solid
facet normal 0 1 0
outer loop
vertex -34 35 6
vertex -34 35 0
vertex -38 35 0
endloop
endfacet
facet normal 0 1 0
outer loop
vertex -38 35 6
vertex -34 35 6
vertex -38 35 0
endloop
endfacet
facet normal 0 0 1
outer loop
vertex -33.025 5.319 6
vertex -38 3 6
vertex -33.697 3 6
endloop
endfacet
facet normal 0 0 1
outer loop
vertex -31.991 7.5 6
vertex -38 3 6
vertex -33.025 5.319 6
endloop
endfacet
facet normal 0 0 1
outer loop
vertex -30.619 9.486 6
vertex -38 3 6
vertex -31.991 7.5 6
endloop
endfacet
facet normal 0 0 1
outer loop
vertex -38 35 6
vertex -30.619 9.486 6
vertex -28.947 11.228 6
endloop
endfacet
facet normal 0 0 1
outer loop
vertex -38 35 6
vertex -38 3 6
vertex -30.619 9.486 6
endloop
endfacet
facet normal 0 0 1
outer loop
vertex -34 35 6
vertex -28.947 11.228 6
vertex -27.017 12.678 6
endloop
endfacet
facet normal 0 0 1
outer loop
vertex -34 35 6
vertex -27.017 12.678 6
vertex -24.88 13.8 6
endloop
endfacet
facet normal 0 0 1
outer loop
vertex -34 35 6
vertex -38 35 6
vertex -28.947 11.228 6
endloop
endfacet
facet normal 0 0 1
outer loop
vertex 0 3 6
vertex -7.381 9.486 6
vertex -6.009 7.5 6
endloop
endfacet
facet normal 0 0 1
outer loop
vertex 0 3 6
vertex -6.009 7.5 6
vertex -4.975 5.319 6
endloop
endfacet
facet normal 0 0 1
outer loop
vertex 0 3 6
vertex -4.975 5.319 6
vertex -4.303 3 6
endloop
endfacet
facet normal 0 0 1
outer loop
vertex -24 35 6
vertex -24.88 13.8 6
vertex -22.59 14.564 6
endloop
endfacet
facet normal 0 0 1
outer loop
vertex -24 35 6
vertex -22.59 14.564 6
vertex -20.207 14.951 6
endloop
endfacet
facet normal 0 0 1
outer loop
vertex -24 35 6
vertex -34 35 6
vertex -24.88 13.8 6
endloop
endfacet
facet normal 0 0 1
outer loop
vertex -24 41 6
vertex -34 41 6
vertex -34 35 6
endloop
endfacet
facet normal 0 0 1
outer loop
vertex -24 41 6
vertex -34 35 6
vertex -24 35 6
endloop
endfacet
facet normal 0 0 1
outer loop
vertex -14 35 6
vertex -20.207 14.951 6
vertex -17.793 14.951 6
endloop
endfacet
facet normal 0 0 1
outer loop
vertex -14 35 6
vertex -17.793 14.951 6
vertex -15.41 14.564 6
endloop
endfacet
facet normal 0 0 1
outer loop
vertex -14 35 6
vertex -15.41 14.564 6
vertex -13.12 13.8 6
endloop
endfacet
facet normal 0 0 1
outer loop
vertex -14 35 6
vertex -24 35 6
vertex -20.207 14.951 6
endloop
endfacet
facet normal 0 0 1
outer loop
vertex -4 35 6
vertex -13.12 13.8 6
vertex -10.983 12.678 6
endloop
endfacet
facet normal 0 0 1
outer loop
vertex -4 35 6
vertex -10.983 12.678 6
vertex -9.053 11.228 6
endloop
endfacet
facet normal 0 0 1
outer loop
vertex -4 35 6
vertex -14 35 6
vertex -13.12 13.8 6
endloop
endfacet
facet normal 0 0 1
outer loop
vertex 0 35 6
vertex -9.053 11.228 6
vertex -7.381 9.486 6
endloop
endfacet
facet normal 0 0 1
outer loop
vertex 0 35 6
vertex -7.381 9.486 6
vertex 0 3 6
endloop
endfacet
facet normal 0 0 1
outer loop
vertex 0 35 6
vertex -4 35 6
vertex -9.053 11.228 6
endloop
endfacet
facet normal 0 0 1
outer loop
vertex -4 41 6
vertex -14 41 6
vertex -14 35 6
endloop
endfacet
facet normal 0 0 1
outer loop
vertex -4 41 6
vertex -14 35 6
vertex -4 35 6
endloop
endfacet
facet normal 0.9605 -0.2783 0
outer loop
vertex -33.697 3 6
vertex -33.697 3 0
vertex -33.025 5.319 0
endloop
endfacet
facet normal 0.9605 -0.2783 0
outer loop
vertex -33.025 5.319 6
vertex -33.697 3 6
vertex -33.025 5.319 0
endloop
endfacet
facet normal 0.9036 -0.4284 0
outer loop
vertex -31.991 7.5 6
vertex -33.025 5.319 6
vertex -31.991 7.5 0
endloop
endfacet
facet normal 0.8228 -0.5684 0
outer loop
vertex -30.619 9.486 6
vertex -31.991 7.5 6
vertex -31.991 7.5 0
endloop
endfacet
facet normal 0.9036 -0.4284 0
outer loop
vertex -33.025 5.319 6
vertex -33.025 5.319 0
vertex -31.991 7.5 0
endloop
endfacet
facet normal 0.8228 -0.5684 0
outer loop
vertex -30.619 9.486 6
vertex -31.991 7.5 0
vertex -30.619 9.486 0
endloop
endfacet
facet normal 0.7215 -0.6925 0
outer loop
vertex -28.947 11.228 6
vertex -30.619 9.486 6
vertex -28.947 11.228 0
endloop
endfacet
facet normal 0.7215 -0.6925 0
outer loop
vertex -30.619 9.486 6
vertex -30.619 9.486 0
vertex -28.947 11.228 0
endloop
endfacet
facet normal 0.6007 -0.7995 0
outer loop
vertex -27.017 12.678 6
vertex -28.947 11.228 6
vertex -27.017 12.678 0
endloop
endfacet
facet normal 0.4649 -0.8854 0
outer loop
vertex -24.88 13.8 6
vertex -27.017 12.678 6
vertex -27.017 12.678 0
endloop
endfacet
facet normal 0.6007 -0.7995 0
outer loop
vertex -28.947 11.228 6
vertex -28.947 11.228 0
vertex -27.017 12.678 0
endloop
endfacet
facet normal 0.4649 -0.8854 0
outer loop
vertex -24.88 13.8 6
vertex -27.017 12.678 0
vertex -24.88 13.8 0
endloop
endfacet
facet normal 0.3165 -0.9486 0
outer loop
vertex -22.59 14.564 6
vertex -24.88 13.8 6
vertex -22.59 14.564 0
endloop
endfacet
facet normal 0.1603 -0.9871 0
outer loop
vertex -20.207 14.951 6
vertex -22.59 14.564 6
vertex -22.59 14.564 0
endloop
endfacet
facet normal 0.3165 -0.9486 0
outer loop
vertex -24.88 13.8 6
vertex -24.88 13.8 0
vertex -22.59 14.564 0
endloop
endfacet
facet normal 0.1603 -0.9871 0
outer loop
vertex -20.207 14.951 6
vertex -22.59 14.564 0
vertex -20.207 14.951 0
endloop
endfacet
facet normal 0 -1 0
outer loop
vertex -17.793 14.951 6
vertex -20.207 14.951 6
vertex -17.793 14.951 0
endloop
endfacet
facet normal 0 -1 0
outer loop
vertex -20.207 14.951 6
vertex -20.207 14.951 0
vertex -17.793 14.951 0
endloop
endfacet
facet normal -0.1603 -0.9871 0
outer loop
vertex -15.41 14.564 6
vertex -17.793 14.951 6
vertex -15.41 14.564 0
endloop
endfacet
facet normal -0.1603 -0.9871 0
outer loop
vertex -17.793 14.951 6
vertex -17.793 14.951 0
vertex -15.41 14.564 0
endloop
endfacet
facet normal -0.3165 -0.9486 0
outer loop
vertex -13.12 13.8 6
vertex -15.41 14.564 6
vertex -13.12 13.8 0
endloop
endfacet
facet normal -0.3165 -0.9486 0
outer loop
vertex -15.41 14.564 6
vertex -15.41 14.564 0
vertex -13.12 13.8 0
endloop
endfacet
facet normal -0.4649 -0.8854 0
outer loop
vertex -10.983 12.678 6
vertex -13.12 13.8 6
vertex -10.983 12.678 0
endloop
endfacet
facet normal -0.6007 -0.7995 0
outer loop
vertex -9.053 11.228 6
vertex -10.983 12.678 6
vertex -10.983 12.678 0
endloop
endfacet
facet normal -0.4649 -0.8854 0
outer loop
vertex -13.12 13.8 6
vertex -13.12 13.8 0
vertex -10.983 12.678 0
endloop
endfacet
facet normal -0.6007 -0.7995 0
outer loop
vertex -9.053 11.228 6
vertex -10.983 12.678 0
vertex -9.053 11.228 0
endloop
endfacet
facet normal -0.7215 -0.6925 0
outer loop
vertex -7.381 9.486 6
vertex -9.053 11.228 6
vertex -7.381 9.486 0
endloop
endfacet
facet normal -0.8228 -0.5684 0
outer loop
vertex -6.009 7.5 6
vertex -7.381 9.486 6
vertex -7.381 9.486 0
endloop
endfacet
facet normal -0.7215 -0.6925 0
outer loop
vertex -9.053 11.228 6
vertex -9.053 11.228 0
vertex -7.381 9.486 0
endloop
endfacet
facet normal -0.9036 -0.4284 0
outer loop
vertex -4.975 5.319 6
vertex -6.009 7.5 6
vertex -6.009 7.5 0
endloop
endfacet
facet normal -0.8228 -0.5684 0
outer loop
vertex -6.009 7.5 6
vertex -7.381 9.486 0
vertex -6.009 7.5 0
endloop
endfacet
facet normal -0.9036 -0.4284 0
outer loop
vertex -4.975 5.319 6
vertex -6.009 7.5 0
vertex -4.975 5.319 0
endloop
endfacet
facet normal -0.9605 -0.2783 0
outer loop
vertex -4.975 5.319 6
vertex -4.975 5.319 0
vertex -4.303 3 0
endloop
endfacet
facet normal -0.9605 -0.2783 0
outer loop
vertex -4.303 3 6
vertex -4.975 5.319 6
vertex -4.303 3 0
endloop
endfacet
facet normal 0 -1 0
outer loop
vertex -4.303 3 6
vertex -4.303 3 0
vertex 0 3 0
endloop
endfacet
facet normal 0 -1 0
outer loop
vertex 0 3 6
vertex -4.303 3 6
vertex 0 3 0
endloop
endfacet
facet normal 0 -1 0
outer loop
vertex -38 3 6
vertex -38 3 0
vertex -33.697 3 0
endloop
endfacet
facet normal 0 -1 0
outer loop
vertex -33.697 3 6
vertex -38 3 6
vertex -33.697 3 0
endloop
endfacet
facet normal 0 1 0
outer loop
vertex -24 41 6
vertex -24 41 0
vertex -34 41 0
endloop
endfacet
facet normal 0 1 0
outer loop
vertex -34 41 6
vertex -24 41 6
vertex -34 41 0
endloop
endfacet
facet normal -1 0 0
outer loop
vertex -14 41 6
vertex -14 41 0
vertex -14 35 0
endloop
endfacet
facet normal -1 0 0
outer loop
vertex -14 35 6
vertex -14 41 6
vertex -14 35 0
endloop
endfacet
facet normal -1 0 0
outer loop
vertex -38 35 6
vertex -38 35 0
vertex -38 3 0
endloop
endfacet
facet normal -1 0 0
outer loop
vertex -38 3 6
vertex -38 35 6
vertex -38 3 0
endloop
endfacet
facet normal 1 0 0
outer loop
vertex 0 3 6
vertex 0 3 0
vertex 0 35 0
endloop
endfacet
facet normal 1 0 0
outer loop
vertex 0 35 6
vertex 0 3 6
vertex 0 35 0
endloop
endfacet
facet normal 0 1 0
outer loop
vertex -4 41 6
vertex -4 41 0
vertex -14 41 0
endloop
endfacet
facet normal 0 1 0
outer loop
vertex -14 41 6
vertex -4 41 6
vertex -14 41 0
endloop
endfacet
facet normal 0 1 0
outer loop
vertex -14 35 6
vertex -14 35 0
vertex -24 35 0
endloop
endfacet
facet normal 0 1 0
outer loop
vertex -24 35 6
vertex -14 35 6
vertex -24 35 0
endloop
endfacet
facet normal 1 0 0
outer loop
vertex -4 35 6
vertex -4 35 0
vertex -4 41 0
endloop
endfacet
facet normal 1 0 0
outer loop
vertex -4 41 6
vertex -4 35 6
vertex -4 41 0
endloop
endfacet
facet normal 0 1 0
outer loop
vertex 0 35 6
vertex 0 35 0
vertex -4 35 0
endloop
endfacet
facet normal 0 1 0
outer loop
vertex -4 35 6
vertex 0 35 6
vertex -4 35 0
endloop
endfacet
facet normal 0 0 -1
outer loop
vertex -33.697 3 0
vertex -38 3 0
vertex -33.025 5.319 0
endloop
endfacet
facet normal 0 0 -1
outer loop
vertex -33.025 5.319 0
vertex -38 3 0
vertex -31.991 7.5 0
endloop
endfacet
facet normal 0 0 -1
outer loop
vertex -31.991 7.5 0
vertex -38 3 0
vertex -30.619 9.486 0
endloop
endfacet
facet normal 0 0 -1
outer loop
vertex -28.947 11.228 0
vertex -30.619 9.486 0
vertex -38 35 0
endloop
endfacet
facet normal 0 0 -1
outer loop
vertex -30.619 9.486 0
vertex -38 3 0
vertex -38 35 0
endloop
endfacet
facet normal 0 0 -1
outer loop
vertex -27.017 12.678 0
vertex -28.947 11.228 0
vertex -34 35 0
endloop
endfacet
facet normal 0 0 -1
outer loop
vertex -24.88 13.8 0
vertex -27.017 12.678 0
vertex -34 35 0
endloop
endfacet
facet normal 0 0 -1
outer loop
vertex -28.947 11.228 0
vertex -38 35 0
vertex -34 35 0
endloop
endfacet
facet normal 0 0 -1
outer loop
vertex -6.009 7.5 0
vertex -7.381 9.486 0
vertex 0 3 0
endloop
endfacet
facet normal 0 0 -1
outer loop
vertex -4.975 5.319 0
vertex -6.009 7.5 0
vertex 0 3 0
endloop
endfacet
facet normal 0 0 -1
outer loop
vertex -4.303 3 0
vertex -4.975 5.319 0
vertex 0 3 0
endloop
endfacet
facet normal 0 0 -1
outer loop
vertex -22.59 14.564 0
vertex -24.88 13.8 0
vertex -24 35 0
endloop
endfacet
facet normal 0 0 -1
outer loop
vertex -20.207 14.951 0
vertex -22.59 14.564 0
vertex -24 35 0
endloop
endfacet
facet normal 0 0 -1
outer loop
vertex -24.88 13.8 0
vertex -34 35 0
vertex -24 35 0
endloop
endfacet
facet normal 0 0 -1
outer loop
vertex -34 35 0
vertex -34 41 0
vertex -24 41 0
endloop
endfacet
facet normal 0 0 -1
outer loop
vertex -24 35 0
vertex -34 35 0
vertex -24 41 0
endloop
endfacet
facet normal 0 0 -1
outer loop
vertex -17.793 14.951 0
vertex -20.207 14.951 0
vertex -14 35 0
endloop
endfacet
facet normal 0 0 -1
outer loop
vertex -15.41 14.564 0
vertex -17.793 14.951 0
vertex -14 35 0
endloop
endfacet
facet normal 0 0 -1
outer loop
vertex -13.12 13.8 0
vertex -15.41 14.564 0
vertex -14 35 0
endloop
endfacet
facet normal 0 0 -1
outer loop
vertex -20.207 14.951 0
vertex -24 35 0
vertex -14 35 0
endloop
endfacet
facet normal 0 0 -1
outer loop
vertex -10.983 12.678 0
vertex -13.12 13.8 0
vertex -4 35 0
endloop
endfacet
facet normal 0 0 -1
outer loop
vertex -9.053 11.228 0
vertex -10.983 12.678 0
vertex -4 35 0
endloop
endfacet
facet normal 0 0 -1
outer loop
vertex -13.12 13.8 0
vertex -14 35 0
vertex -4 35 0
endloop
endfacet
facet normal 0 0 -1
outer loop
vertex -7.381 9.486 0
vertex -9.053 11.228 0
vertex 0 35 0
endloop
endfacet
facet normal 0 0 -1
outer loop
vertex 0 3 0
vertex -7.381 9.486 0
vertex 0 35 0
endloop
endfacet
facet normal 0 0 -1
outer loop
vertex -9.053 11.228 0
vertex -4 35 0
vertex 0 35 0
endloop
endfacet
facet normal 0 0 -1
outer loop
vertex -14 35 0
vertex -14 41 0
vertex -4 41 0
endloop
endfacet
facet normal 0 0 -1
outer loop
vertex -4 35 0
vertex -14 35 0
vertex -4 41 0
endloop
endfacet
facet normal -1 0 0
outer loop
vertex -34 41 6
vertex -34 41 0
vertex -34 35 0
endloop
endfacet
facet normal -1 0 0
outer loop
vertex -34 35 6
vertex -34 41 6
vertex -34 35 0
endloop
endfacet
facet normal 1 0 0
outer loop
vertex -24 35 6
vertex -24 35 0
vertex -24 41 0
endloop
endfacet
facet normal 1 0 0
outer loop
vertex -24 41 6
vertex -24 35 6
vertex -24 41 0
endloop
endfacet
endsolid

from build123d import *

# Parameters (mm, degrees)
BOSS_EXTRUDE1_DEPTH = 6


with BuildPart() as part:
    # Sketch1 → Boss-Extrude1 (new body)
    with BuildSketch(Plane.XY):
        with BuildLine():
            Line((-38, 35), (-38, 4))
            Line((-38, 4), (-38, 3))
            Line((-38, 3), (-33.696938457, 3))
            ThreePointArc((-33.696938457, 3), (-19, 15), (-4.303061543, 3))
            Line((-4.303061543, 3), (0, 3))
            Line((0, 3), (0, 4))
            Line((0, 4), (0, 35))
            Line((0, 35), (-4, 35))
            Line((-4, 35), (-4, 41))
            Line((-4, 41), (-14, 41))
            Line((-14, 41), (-14, 35))
            Line((-14, 35), (-24, 35))
            Line((-24, 35), (-24, 41))
            Line((-24, 41), (-34, 41))
            Line((-34, 41), (-34, 35))
            Line((-34, 35), (-38, 35))
        make_face()
    extrude(amount=BOSS_EXTRUDE1_DEPTH)


solid = part.part
